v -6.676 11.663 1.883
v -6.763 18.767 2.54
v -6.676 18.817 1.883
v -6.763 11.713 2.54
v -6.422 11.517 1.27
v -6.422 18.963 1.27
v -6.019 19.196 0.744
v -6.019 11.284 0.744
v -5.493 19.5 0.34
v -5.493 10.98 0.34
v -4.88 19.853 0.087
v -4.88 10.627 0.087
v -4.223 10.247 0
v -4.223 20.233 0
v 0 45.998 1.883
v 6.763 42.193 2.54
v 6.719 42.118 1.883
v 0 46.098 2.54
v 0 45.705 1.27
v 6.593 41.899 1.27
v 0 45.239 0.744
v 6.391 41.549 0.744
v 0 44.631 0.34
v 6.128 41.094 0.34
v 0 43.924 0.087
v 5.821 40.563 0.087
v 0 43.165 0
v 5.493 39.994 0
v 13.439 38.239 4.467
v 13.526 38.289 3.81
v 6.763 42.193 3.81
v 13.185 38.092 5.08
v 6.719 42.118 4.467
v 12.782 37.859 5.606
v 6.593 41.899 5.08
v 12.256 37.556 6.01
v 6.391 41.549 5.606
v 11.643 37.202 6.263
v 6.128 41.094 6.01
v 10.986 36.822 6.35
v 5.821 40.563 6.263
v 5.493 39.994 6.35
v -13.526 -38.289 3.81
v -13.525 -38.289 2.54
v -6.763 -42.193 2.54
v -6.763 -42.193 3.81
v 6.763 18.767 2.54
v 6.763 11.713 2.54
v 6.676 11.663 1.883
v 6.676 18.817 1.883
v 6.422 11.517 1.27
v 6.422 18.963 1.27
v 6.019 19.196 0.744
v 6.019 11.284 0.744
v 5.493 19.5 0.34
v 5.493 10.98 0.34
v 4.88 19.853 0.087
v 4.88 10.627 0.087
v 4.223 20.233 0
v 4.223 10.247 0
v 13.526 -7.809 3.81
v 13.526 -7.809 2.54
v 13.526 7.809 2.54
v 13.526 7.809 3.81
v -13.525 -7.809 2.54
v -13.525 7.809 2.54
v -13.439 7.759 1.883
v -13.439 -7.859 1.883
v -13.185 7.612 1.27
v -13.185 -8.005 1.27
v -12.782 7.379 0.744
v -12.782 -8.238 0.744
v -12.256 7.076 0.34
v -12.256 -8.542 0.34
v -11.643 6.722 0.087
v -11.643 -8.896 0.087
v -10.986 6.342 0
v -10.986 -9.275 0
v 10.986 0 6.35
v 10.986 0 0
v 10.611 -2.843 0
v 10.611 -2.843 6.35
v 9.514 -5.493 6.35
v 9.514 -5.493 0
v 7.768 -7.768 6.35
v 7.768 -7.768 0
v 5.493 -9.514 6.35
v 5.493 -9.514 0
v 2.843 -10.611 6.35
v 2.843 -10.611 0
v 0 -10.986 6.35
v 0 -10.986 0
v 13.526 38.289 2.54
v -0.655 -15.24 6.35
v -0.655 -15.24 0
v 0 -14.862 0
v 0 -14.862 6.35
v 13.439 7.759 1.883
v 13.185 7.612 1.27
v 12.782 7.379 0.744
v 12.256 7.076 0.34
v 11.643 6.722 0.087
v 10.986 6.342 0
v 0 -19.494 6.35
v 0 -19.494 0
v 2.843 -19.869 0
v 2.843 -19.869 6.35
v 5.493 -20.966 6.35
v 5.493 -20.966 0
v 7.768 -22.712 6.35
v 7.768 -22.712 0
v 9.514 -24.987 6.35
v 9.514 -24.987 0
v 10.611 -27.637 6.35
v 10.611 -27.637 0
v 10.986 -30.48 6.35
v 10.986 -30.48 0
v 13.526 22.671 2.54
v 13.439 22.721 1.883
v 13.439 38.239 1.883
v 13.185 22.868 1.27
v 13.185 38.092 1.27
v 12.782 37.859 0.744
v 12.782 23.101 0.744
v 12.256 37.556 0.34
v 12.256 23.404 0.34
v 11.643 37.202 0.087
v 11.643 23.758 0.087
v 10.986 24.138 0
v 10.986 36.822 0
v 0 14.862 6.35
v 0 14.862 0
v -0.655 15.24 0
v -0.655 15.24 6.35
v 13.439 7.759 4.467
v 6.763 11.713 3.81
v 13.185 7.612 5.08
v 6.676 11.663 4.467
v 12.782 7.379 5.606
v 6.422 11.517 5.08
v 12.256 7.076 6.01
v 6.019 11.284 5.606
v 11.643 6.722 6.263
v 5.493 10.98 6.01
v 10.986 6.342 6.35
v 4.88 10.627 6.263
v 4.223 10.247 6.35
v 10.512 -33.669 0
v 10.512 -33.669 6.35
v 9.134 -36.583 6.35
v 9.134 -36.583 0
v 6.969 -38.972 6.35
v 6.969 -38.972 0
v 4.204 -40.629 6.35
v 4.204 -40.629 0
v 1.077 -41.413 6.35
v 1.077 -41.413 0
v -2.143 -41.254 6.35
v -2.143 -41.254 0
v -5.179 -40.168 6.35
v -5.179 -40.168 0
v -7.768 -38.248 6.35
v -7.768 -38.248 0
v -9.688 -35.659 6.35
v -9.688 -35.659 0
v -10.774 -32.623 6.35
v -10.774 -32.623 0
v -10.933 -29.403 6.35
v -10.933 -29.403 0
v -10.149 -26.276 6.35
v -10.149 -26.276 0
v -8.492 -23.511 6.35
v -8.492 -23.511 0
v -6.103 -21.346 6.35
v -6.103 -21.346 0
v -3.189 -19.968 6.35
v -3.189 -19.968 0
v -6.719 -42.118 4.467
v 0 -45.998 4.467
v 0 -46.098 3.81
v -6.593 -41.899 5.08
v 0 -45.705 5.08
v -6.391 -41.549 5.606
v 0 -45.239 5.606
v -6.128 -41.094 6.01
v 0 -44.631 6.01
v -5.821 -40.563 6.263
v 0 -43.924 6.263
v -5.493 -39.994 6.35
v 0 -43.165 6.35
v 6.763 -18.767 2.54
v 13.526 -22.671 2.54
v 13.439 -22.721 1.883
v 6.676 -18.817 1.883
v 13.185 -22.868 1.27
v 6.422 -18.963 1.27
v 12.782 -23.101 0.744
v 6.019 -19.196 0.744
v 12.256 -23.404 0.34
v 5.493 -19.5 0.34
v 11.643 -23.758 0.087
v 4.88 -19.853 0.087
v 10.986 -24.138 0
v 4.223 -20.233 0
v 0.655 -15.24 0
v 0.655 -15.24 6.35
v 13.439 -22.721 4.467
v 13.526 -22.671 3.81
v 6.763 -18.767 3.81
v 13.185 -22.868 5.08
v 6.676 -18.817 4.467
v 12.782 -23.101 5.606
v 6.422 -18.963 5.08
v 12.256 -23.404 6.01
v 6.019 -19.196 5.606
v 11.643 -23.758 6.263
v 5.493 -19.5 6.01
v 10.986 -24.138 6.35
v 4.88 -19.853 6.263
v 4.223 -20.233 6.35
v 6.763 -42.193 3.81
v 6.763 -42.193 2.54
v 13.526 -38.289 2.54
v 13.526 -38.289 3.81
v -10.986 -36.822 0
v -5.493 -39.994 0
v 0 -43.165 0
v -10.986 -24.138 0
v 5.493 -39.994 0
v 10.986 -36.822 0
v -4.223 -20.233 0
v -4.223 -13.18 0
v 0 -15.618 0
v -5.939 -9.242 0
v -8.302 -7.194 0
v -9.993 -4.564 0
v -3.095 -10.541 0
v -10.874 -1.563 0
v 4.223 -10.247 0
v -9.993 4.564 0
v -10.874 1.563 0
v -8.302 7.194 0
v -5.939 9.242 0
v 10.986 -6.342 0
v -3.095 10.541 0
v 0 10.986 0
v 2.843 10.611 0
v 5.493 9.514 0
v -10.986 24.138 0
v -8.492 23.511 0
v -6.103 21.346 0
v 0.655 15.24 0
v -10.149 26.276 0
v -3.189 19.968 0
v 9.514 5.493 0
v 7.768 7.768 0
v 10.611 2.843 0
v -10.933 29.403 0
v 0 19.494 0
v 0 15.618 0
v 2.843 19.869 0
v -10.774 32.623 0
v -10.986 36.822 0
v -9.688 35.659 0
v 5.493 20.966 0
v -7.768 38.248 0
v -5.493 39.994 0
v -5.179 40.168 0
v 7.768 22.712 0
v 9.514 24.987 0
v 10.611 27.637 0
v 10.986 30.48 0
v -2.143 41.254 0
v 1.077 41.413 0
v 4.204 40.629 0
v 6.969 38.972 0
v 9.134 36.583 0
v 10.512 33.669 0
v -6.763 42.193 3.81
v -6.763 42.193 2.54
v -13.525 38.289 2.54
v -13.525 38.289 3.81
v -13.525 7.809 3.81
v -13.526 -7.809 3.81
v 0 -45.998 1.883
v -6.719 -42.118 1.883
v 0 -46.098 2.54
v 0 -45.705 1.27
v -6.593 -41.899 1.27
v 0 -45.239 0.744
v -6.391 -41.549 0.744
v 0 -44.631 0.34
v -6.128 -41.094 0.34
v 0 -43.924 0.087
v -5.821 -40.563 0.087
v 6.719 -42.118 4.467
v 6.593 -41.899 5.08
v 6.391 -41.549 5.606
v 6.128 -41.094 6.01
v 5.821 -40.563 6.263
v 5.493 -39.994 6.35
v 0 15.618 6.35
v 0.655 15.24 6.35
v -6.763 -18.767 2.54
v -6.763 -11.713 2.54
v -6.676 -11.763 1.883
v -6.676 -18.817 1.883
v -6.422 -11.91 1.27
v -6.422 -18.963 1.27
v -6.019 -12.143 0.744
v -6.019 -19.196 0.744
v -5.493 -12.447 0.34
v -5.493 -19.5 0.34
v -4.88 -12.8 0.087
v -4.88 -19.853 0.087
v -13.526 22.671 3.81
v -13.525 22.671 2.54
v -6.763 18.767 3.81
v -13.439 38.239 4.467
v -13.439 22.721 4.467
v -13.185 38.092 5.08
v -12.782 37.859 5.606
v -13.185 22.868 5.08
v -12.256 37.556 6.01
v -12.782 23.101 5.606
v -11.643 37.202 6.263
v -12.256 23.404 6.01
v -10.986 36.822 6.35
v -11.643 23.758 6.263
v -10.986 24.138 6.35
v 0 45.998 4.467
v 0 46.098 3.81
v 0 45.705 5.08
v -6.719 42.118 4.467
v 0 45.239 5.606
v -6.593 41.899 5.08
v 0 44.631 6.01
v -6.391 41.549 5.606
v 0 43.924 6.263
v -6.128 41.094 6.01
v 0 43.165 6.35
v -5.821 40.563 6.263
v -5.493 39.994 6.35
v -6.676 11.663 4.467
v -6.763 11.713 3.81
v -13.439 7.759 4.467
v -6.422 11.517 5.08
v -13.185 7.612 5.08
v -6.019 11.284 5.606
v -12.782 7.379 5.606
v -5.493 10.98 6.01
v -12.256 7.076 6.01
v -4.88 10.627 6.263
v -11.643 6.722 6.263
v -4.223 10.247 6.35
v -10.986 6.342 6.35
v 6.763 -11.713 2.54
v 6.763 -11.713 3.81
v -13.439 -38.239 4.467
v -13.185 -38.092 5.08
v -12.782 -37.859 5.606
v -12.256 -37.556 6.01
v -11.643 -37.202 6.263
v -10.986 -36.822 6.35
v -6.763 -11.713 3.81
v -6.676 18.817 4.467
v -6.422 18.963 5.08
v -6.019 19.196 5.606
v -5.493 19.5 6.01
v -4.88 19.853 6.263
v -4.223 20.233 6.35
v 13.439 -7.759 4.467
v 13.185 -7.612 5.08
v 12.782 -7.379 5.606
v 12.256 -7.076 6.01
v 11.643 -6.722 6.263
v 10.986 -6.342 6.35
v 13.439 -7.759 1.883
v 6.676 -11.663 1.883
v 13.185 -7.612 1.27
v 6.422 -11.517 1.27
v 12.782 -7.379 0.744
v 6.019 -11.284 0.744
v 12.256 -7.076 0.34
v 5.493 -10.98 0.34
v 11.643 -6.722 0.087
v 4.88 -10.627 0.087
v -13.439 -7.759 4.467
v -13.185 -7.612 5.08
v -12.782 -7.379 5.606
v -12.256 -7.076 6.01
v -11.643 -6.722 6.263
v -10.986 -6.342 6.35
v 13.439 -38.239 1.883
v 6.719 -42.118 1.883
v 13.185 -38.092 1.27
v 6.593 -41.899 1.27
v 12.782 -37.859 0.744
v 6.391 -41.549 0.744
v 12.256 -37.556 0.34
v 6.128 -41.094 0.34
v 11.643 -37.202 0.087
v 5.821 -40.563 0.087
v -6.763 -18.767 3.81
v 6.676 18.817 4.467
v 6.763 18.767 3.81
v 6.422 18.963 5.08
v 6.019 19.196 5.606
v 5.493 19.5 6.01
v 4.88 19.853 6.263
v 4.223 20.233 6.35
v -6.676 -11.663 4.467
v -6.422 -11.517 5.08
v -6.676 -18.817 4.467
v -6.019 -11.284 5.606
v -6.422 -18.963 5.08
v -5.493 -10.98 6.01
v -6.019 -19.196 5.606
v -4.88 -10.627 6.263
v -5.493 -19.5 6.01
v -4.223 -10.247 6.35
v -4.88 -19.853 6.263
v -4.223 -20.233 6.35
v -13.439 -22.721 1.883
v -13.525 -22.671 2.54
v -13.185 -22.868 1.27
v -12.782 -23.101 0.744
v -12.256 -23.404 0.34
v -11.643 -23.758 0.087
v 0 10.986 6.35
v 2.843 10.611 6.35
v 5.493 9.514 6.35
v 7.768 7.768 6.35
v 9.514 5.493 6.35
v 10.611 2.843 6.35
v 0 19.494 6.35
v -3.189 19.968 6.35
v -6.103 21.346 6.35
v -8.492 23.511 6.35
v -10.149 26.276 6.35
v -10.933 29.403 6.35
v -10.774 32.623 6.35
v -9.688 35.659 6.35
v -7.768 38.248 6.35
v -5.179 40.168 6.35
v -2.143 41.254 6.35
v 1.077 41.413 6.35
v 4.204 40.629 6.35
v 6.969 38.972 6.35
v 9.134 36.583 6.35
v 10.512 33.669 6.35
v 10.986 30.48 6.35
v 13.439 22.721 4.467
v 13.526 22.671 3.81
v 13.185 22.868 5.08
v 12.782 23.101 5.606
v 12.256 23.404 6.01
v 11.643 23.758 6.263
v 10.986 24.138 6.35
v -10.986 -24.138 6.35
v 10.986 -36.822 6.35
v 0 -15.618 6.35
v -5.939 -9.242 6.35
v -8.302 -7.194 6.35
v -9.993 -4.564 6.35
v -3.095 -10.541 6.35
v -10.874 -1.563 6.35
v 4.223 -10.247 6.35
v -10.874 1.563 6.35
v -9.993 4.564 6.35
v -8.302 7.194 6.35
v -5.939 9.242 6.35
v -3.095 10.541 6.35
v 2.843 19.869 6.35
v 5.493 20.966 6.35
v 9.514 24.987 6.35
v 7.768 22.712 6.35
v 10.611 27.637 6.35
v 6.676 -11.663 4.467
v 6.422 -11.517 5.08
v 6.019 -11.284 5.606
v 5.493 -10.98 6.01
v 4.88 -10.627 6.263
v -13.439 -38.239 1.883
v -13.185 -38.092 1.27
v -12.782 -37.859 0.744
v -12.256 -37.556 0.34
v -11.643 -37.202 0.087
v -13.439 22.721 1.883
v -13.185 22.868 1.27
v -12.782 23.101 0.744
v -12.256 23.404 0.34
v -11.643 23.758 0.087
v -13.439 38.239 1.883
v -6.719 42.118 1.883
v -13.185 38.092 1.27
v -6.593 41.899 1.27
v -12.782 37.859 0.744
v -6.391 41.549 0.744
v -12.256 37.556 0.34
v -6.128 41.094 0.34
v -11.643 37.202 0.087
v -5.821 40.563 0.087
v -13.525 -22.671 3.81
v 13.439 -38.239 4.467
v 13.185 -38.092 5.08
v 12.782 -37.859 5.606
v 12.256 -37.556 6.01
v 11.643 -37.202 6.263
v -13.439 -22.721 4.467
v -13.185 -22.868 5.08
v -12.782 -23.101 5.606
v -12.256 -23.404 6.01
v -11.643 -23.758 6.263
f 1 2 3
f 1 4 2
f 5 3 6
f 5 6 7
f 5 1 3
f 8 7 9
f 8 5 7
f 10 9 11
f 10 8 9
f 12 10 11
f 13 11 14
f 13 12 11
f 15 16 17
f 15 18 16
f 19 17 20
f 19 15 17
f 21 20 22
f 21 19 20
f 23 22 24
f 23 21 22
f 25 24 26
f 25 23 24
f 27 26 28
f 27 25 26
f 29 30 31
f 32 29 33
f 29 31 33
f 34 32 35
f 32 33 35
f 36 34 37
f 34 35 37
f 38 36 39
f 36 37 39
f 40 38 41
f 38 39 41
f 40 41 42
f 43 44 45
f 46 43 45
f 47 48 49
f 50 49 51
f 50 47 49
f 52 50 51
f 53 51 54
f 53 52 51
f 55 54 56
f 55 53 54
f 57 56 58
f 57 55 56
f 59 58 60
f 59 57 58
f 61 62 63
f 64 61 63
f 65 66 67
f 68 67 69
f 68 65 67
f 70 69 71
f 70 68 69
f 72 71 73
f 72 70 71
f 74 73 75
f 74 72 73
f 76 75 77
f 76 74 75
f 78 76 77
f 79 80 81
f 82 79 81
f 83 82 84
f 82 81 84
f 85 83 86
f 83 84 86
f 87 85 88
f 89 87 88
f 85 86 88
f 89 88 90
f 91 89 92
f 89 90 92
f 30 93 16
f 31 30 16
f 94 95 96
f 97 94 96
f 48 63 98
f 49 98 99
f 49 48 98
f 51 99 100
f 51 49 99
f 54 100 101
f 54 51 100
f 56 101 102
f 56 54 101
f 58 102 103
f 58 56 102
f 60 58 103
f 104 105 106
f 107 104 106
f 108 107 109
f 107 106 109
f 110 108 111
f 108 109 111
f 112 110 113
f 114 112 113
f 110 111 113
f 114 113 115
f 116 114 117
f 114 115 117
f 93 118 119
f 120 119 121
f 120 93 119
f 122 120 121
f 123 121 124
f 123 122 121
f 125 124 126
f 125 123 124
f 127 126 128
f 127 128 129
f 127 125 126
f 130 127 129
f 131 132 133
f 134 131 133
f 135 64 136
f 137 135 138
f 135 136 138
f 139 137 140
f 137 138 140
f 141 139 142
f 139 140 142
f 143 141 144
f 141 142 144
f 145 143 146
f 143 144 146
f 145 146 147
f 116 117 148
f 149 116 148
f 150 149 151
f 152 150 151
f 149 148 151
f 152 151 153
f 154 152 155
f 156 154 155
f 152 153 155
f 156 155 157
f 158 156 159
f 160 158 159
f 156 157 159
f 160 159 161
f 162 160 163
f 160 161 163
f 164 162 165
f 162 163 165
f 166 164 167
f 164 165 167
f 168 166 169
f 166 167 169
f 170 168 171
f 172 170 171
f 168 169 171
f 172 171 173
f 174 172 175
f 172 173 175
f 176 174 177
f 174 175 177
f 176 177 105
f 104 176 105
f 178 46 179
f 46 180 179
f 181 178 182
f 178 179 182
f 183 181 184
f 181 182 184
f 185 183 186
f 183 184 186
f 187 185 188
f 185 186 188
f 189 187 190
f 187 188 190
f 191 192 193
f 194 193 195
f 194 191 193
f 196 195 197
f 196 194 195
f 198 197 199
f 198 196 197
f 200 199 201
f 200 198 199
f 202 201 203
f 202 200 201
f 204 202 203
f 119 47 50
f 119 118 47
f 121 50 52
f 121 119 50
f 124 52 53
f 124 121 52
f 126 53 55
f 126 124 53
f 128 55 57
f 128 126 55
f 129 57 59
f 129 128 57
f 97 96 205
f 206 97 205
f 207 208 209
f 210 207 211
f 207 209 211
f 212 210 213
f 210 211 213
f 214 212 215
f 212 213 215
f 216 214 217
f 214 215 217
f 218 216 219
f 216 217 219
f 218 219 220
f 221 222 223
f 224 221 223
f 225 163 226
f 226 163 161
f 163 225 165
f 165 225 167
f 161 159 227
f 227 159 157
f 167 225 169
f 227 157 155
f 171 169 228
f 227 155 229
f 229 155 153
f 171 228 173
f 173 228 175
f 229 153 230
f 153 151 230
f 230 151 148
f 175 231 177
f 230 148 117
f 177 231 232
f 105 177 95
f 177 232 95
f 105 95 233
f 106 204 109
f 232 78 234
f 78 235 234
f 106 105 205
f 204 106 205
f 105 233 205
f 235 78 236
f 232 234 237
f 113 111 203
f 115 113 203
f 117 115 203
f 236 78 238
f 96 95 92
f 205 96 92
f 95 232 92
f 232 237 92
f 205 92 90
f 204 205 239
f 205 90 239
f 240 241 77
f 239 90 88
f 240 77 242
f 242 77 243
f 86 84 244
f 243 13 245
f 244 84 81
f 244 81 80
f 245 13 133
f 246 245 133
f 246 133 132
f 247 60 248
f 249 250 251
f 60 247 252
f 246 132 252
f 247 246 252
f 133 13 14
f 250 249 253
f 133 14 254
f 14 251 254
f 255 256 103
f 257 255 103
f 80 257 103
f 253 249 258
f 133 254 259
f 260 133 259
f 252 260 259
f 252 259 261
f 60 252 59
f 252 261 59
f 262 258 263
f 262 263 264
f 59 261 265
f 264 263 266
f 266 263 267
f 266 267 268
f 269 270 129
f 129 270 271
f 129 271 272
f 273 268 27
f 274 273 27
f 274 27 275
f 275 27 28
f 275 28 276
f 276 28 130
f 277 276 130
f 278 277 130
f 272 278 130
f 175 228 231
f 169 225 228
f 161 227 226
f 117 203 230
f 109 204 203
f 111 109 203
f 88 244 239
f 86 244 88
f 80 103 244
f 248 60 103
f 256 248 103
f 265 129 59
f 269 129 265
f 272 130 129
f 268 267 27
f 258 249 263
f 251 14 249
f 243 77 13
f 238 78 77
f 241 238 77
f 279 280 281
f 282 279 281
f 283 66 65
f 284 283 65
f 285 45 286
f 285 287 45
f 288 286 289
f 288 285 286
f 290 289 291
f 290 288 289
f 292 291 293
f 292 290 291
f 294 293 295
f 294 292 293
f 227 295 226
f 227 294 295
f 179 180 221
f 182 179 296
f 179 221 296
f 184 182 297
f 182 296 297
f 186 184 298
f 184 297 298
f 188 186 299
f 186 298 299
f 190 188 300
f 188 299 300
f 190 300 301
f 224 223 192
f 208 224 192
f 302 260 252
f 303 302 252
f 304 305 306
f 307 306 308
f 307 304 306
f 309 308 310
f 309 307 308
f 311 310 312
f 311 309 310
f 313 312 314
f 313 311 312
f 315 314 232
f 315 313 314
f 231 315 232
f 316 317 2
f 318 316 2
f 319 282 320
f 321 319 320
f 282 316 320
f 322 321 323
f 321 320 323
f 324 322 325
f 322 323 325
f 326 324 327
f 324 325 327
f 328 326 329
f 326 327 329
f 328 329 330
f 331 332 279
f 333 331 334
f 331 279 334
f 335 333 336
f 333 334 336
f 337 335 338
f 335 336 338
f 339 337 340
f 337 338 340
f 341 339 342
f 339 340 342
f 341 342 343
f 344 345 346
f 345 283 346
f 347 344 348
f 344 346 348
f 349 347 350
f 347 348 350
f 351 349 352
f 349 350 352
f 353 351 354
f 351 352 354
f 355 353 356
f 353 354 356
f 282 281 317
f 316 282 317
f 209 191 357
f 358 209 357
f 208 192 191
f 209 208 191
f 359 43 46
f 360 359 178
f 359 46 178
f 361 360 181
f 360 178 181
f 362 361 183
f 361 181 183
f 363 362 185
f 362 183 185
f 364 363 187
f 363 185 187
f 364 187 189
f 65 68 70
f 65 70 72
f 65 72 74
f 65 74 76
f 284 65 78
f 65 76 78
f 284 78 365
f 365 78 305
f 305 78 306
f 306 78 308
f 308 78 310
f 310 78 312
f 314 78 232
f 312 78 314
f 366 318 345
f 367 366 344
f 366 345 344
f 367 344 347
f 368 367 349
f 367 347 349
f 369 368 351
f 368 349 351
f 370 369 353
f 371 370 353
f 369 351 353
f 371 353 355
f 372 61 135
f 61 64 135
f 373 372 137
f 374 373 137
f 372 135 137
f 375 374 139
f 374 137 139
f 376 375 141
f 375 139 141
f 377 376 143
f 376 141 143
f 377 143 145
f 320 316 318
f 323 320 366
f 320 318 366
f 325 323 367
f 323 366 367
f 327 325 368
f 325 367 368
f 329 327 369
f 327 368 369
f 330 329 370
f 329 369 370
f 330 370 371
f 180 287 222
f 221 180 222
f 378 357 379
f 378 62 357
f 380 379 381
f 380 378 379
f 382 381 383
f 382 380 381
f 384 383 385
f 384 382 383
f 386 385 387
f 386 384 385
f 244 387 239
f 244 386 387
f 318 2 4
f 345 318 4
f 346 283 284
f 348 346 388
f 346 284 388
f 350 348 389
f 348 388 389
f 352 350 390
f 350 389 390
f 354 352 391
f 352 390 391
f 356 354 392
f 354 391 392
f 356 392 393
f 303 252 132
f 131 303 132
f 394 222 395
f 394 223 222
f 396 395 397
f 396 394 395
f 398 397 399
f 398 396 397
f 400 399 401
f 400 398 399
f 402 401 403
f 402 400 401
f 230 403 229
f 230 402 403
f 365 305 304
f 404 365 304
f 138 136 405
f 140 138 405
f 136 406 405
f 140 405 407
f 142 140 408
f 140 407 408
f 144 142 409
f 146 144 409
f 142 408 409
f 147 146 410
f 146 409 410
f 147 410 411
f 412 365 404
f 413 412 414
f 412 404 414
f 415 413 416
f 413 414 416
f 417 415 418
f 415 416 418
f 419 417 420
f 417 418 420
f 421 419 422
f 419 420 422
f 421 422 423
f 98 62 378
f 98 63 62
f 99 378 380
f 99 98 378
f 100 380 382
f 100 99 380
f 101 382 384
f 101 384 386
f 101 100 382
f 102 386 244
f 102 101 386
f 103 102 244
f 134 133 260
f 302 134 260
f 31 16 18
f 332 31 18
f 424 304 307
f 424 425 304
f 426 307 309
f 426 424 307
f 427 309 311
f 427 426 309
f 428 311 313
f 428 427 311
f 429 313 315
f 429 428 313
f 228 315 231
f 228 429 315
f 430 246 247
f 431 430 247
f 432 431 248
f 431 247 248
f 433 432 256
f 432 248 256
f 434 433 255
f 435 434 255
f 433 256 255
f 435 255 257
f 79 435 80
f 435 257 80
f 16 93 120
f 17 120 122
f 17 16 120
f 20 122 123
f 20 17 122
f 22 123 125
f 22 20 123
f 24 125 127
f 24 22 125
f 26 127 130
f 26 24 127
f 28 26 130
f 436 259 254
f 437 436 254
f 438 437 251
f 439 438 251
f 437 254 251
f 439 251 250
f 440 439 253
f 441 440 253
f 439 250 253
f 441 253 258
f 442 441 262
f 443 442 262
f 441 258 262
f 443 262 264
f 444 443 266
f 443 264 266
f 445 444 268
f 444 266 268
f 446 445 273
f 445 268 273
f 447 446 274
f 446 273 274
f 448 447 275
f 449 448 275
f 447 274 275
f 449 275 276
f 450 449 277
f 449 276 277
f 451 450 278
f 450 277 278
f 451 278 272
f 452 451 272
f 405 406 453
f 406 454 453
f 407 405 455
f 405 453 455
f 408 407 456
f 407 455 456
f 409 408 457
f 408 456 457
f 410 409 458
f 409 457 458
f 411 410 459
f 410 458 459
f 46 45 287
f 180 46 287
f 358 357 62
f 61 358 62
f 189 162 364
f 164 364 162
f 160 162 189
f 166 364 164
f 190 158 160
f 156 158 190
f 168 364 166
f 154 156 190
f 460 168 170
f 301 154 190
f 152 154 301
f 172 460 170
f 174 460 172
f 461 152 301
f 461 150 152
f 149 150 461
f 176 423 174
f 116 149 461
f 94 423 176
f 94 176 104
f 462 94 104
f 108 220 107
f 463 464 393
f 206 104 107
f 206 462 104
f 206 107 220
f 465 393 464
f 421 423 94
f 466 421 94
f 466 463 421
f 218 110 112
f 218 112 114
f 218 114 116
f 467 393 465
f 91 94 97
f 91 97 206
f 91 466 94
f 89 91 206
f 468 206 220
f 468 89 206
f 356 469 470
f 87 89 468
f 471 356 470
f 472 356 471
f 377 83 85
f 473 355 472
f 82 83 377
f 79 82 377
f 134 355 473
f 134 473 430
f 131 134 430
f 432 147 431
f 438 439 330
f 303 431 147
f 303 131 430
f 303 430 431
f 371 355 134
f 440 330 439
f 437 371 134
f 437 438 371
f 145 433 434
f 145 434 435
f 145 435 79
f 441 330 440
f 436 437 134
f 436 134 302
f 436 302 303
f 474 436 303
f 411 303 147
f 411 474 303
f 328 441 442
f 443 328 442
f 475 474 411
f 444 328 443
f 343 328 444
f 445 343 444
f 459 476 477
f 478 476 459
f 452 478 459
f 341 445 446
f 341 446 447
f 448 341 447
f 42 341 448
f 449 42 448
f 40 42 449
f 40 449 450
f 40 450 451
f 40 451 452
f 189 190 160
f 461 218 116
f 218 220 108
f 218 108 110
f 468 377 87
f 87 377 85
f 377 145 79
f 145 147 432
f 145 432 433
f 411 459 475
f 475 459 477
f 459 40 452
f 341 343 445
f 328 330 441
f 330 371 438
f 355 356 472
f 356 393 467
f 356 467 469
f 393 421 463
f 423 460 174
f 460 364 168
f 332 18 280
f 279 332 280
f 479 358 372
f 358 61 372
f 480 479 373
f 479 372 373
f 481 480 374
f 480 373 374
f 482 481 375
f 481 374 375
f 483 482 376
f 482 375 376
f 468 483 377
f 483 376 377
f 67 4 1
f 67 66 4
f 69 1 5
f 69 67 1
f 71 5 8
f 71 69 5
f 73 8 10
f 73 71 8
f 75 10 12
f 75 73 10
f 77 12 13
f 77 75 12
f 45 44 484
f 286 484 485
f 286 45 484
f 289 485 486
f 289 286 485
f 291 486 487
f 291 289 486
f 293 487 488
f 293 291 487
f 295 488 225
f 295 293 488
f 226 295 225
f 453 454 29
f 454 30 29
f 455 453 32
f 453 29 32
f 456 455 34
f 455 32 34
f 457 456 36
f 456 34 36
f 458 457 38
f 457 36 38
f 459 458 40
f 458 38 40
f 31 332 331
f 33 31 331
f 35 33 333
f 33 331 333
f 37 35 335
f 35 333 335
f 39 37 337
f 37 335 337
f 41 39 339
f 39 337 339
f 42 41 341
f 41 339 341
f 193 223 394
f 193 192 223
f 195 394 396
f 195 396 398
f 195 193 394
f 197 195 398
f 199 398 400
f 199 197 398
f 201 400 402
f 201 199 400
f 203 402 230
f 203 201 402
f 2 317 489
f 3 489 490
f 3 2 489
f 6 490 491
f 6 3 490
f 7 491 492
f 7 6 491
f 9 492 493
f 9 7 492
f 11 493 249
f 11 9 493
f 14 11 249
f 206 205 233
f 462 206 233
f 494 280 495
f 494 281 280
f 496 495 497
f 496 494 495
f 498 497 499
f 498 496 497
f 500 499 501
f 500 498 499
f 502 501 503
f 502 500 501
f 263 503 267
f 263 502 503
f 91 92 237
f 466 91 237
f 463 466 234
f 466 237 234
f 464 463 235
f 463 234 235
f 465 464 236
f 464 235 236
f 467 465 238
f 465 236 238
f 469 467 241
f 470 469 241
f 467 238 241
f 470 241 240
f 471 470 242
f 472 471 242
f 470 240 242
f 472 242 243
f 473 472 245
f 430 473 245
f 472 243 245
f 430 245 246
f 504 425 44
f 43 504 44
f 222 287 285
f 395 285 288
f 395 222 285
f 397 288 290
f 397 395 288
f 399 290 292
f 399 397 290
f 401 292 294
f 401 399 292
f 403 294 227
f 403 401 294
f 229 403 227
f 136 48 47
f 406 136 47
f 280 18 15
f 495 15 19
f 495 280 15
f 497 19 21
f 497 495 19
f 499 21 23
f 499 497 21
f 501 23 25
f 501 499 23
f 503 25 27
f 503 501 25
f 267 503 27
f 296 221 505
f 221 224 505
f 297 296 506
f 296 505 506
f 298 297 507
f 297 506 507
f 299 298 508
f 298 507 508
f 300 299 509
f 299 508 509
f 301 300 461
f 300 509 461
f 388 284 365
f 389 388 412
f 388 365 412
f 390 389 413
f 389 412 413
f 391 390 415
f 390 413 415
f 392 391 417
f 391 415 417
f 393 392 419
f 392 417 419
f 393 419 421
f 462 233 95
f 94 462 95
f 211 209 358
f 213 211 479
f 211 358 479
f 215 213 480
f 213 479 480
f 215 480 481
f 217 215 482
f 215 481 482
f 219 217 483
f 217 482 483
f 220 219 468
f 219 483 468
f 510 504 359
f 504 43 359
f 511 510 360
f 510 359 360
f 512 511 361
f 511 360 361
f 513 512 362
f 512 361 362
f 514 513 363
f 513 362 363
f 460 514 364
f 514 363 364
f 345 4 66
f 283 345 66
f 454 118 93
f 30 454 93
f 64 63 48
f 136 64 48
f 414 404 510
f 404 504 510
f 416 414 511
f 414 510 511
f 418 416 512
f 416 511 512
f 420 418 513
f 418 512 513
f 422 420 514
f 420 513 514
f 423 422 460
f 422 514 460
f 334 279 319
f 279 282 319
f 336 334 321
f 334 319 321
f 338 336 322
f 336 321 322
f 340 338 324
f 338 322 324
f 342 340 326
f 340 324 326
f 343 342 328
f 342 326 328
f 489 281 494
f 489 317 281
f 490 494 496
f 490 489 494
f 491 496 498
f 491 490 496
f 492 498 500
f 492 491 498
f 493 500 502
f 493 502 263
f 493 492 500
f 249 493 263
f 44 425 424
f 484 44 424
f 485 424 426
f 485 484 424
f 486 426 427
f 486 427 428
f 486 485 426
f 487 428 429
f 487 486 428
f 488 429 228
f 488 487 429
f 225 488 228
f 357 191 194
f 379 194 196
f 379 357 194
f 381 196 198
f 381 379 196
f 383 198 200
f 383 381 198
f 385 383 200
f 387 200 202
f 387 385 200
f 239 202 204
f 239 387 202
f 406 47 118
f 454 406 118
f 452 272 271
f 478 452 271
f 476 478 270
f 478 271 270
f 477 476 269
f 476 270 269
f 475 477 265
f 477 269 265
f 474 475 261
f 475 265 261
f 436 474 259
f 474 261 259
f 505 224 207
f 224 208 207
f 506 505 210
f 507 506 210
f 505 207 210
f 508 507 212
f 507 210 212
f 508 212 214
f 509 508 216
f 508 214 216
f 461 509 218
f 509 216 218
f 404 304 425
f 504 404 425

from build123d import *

# Parameters (mm, degrees)
F1_DEPTH = 6.35
F2_R     = 2.53999


# Not quite as in the source:
# - a fillet or chamfer is up to 0.001 mm smaller than in the source, because OpenCascade refuses the exact size


with BuildPart() as f1:
    # F0 (on Top) → F1 (new body)
    with BuildSketch(Plane.XY):
        with BuildLine():
            ThreePointArc((6.76275, -11.7134265989), (11.7134265989, -6.76275), (13.5255, 0))
            ThreePointArc((13.5255, 0), (11.7134265989, 6.76275), (6.76275, 11.7134265989))
            ThreePointArc((6.76275, 11.7134265989), (3.5006569945, 13.0646297635), (0, 13.5255))
            Line((0, 13.5255), (0, 10.9855))
            ThreePointArc((0, 10.9855), (7.7679215447, 7.7679215447), (10.9855, 0))
            ThreePointArc((10.9855, 0), (7.7679215447, -7.7679215447), (0, -10.9855))
            Line((0, -10.9855), (0, -13.5255))
            ThreePointArc((0, -13.5255), (3.5006569945, -13.0646297635), (6.76275, -11.7134265989))
        make_face()
        with BuildLine():
            Line((13.5255, -7.8089510659), (13.5255, 0))
            ThreePointArc((13.5255, 0), (11.7134265989, -6.76275), (6.76275, -11.7134265989))
            Line((6.76275, -11.7134265989), (13.5255, -7.8089510659))
        make_face()
        with BuildLine():
            ThreePointArc((6.76275, 11.7134265989), (11.7134265989, 6.76275), (13.5255, 0))
            Line((13.5255, 0), (13.5255, 7.8089510659))
            Line((13.5255, 7.8089510659), (6.76275, 11.7134265989))
        make_face()
        with BuildLine():
            ThreePointArc((0, 13.5255), (3.5006569945, 13.0646297635), (6.76275, 11.7134265989))
            Line((6.76275, 11.7134265989), (0.6545456927, 15.24))
            Line((0.6545456927, 15.24), (0, 14.8620978682))
            Line((0, 14.8620978682), (0, 13.5255))
        make_face()
        Polygon((0.6545456927, 15.24), (6.76275, 11.7134265989), (6.76275, 18.7665734011), align=None)
        with BuildLine():
            Line((0.6545456927, -15.24), (6.76275, -11.7134265989))
            ThreePointArc((6.76275, -11.7134265989), (3.5006569945, -13.0646297635), (0, -13.5255))
            Line((0, -13.5255), (0, -14.8620978682))
            Line((0, -14.8620978682), (0.6545456927, -15.24))
        make_face()
        Polygon((6.76275, -18.7665734011), (6.76275, -11.7134265989), (0.6545456927, -15.24), align=None)
        with BuildLine():
            Line((0, 10.9855), (0, 13.5255))
            ThreePointArc((0, 13.5255), (-3.5006569945, 13.0646297635), (-6.76275, 11.7134265989))
            ThreePointArc((-6.76275, 11.7134265989), (-11.7134265989, 6.76275), (-13.5255, 0))
            ThreePointArc((-13.5255, 0), (-11.7134265989, -6.76275), (-6.76275, -11.7134265989))
            ThreePointArc((-6.76275, -11.7134265989), (-3.5006569945, -13.0646297635), (0, -13.5255))
            Line((0, -13.5255), (0, -10.9855))
            ThreePointArc((0, -10.9855), (-10.9855, 0), (0, 10.9855))
        make_face()
        with BuildLine():
            ThreePointArc((-6.76275, 11.7134265989), (-3.5006569945, 13.0646297635), (0, 13.5255))
            Line((0, 13.5255), (0, 14.8620978682))
            Line((0, 14.8620978682), (-0.6545456927, 15.24))
            Line((-0.6545456927, 15.24), (-6.76275, 11.7134265989))
        make_face()
        with BuildLine():
            Line((0, 15.6179021318), (0.6545456927, 15.24))
            Line((0.6545456927, 15.24), (6.76275, 18.7665734011))
            ThreePointArc((6.76275, 18.7665734011), (3.5006569945, 17.4153702365), (0, 16.9545))
            Line((0, 16.9545), (0, 15.6179021318))
        make_face()
        with BuildLine():
            ThreePointArc((0, 16.9545), (3.5006569945, 17.4153702365), (6.76275, 18.7665734011))
            ThreePointArc((6.76275, 18.7665734011), (11.7134265989, 23.71725), (13.5255, 30.48))
            ThreePointArc((13.5255, 30.48), (11.7134266013, 37.2427499958), (6.7627500083, 42.1934265941))
            ThreePointArc((6.7627500083, 42.1934265941), (-1.056e-07, 44.0055), (-6.7627501912, 42.1934264885))
            ThreePointArc((-6.7627501912, 42.1934264885), (-11.7134266541, 37.2427499044), (-13.5255, 30.48))
            ThreePointArc((-13.5255, 30.48), (-11.7134265989, 23.71725), (-6.76275, 18.7665734011))
            ThreePointArc((-6.76275, 18.7665734011), (-3.5006569945, 17.4153702365), (0, 16.9545))
        make_face()
        with BuildLine():
            ThreePointArc((10.9855, 30.48), (7.7679215447, 22.7120784553), (0, 19.4945))
            ThreePointArc((0, 19.4945), (-7.7679215447, 38.2479215447), (10.9855, 30.48))
        make_face(mode=Mode.SUBTRACT)
        with BuildLine():
            ThreePointArc((13.5255, 30.48), (11.7134265989, 23.71725), (6.76275, 18.7665734011))
            Line((6.76275, 18.7665734011), (13.5255, 22.6710489341))
            Line((13.5255, 22.6710489341), (13.5255, 30.48))
        make_face()
        with BuildLine():
            Line((0, -14.8620978682), (0, -13.5255))
            ThreePointArc((0, -13.5255), (-3.5006569945, -13.0646297635), (-6.76275, -11.7134265989))
            Line((-6.76275, -11.7134265989), (-0.6545456927, -15.24))
            Line((-0.6545456927, -15.24), (0, -14.8620978682))
        make_face()
        with BuildLine():
            Line((6.76275, -18.7665734011), (0.6545456927, -15.24))
            Line((0.6545456927, -15.24), (0, -15.6179021318))
            Line((0, -15.6179021318), (0, -16.9545))
            ThreePointArc((0, -16.9545), (3.5006569945, -17.4153702365), (6.76275, -18.7665734011))
        make_face()
        with BuildLine():
            Line((13.5255, -22.6710489341), (6.76275, -18.7665734011))
            ThreePointArc((6.76275, -18.7665734011), (11.7134265989, -23.71725), (13.5255, -30.48))
            Line((13.5255, -30.48), (13.5255, -22.6710489341))
        make_face()
        with BuildLine():
            ThreePointArc((13.5255, -30.48), (11.7134265989, -23.71725), (6.76275, -18.7665734011))
            ThreePointArc((6.76275, -18.7665734011), (3.5006569945, -17.4153702365), (0, -16.9545))
            ThreePointArc((0, -16.9545), (-3.5006569945, -17.4153702365), (-6.76275, -18.7665734011))
            ThreePointArc((-6.76275, -18.7665734011), (-11.7134265989, -23.71725), (-13.5255, -30.48))
            ThreePointArc((-13.5255, -30.48), (-11.7134266419, -37.2427499255), (-6.762750149, -42.1934265129))
            ThreePointArc((-6.762750149, -42.1934265129), (-1.97e-07, -44.0055), (6.7627498078, -42.1934267099))
            ThreePointArc((6.7627498078, -42.1934267099), (11.7134265434, -37.2427500961), (13.5255, -30.48))
        make_face()
        with BuildLine():
            ThreePointArc((10.9855, -30.48), (-7.7679215447, -38.2479215447), (0, -19.4945))
            ThreePointArc((0, -19.4945), (7.7679215447, -22.7120784553), (10.9855, -30.48))
        make_face(mode=Mode.SUBTRACT)
        with BuildLine():
            ThreePointArc((-13.5255, 0), (-11.7134265989, 6.76275), (-6.76275, 11.7134265989))
            Line((-6.76275, 11.7134265989), (-13.5255, 7.8089510659))
            Line((-13.5255, 7.8089510659), (-13.5255, 0))
        make_face()
        Polygon((-6.76275, 18.7665734011), (-6.76275, 11.7134265989), (-0.6545456927, 15.24), align=None)
        with BuildLine():
            Line((-0.6545456927, 15.24), (0, 15.6179021318))
            Line((0, 15.6179021318), (0, 16.9545))
            ThreePointArc((0, 16.9545), (-3.5006569945, 17.4153702365), (-6.76275, 18.7665734011))
            Line((-6.76275, 18.7665734011), (-0.6545456927, 15.24))
        make_face()
        with BuildLine():
            ThreePointArc((6.7627500083, 42.1934265941), (11.7134266013, 37.2427499958), (13.5255, 30.48))
            Line((13.5255, 30.48), (13.5255, 38.2889510659))
            Line((13.5255, 38.2889510659), (6.7627500083, 42.1934265941))
        make_face()
        with BuildLine():
            Line((-13.5255, -7.8089510659), (-6.76275, -11.7134265989))
            ThreePointArc((-6.76275, -11.7134265989), (-11.7134265989, -6.76275), (-13.5255, 0))
            Line((-13.5255, 0), (-13.5255, -7.8089510659))
        make_face()
        Polygon((-0.6545456927, -15.24), (-6.76275, -11.7134265989), (-6.76275, -18.7665734011), align=None)
        with BuildLine():
            Line((0, -16.9545), (0, -15.6179021318))
            Line((0, -15.6179021318), (-0.6545456927, -15.24))
            Line((-0.6545456927, -15.24), (-6.76275, -18.7665734011))
            ThreePointArc((-6.76275, -18.7665734011), (-3.5006569945, -17.4153702365), (0, -16.9545))
        make_face()
        with BuildLine():
            Line((13.5255, -38.2889510659), (13.5255, -30.48))
            ThreePointArc((13.5255, -30.48), (11.7134265434, -37.2427500961), (6.7627498078, -42.1934267099))
            Line((6.7627498078, -42.1934267099), (13.5255, -38.2889510659))
        make_face()
        with BuildLine():
            Line((-13.5255, 22.6710489341), (-6.76275, 18.7665734011))
            ThreePointArc((-6.76275, 18.7665734011), (-11.7134265989, 23.71725), (-13.5255, 30.48))
            Line((-13.5255, 30.48), (-13.5255, 22.6710489341))
        make_face()
        with BuildLine():
            ThreePointArc((-6.7627501912, 42.1934264885), (-1.056e-07, 44.0055), (6.7627500083, 42.1934265941))
            Line((6.7627500083, 42.1934265941), (0, 46.0979021318))
            Line((0, 46.0979021318), (-6.7627501912, 42.1934264885))
        make_face()
        with BuildLine():
            ThreePointArc((-13.5255, -30.48), (-11.7134265989, -23.71725), (-6.76275, -18.7665734011))
            Line((-6.76275, -18.7665734011), (-13.5255, -22.6710489341))
            Line((-13.5255, -22.6710489341), (-13.5255, -30.48))
        make_face()
        with BuildLine():
            Line((0, -46.0979021318), (6.7627498078, -42.1934267099))
            ThreePointArc((6.7627498078, -42.1934267099), (-1.97e-07, -44.0055), (-6.762750149, -42.1934265129))
            Line((-6.762750149, -42.1934265129), (0, -46.0979021318))
        make_face()
        with BuildLine():
            Line((-13.5255, 38.2889510659), (-13.5255, 30.48))
            ThreePointArc((-13.5255, 30.48), (-11.7134266541, 37.2427499044), (-6.7627501912, 42.1934264885))
            Line((-6.7627501912, 42.1934264885), (-13.5255, 38.2889510659))
        make_face()
        with BuildLine():
            ThreePointArc((-6.762750149, -42.1934265129), (-11.7134266419, -37.2427499255), (-13.5255, -30.48))
            Line((-13.5255, -30.48), (-13.5255, -38.2889510659))
            Line((-13.5255, -38.2889510659), (-6.762750149, -42.1934265129))
        make_face()
    extrude(amount=F1_DEPTH)

    # F2 (radius 2.54 in the source; OpenCascade refuses exactly that, so slightly less here)
    f2_edges = [f1.edges().sort_by_distance(p)[0] for p in [
        (-6.76275, -42.193427, 6.35),
        (6.76275, -42.193427, 6.35),
        (13.5255, -30.48, 6.35),
        (-13.5255, -30.48, 6.35),
        (-10.144125, -20.718811, 6.35),
        (-6.76275, -15.24, 6.35),
        (10.144125, -20.718811, 6.35),
        (6.76275, -15.24, 6.35),
        (-10.144125, -9.761189, 6.35),
        (-13.5255, 0, 6.35),
        (-10.144125, 9.761189, 6.35),
        (-6.76275, 15.24, 6.35),
        (-10.144125, 20.718811, 6.35),
        (-13.5255, 30.48, 6.35),
        (-6.76275, 42.193427, 6.35),
        (6.76275, 42.193427, 6.35),
        (13.5255, 30.48, 6.35),
        (6.76275, 15.24, 6.35),
        (10.144125, 20.718811, 6.35),
        (10.144125, 9.761189, 6.35),
        (10.144125, -9.761189, 6.35),
        (13.5255, 0, 6.35),
        (-13.5255, -30.48, 0),
        (-6.76275, -42.193427, 0),
        (6.76275, -42.193427, 0),
        (13.5255, -30.48, 0),
        (10.144125, -20.718811, 0),
        (6.76275, -15.24, 0),
        (-10.144125, -20.718811, 0),
        (-6.76275, -15.24, 0),
        (-13.5255, 0, 0),
        (-10.144125, 9.761189, 0),
        (-6.76275, 15.24, 0),
        (-13.5255, 30.48, 0),
        (-6.76275, 42.193427, 0),
        (6.76275, 42.193427, 0),
        (13.5255, 30.48, 0),
        (10.144125, 20.718811, 0),
        (6.76275, 15.24, 0),
        (10.144125, 9.761189, 0),
        (10.144125, -9.761189, 0),
        (13.5255, 0, 0),
        (-10.144125, 20.718811, 0),
    ]]
    fillet(f2_edges, radius=F2_R)


solid = f1.part
